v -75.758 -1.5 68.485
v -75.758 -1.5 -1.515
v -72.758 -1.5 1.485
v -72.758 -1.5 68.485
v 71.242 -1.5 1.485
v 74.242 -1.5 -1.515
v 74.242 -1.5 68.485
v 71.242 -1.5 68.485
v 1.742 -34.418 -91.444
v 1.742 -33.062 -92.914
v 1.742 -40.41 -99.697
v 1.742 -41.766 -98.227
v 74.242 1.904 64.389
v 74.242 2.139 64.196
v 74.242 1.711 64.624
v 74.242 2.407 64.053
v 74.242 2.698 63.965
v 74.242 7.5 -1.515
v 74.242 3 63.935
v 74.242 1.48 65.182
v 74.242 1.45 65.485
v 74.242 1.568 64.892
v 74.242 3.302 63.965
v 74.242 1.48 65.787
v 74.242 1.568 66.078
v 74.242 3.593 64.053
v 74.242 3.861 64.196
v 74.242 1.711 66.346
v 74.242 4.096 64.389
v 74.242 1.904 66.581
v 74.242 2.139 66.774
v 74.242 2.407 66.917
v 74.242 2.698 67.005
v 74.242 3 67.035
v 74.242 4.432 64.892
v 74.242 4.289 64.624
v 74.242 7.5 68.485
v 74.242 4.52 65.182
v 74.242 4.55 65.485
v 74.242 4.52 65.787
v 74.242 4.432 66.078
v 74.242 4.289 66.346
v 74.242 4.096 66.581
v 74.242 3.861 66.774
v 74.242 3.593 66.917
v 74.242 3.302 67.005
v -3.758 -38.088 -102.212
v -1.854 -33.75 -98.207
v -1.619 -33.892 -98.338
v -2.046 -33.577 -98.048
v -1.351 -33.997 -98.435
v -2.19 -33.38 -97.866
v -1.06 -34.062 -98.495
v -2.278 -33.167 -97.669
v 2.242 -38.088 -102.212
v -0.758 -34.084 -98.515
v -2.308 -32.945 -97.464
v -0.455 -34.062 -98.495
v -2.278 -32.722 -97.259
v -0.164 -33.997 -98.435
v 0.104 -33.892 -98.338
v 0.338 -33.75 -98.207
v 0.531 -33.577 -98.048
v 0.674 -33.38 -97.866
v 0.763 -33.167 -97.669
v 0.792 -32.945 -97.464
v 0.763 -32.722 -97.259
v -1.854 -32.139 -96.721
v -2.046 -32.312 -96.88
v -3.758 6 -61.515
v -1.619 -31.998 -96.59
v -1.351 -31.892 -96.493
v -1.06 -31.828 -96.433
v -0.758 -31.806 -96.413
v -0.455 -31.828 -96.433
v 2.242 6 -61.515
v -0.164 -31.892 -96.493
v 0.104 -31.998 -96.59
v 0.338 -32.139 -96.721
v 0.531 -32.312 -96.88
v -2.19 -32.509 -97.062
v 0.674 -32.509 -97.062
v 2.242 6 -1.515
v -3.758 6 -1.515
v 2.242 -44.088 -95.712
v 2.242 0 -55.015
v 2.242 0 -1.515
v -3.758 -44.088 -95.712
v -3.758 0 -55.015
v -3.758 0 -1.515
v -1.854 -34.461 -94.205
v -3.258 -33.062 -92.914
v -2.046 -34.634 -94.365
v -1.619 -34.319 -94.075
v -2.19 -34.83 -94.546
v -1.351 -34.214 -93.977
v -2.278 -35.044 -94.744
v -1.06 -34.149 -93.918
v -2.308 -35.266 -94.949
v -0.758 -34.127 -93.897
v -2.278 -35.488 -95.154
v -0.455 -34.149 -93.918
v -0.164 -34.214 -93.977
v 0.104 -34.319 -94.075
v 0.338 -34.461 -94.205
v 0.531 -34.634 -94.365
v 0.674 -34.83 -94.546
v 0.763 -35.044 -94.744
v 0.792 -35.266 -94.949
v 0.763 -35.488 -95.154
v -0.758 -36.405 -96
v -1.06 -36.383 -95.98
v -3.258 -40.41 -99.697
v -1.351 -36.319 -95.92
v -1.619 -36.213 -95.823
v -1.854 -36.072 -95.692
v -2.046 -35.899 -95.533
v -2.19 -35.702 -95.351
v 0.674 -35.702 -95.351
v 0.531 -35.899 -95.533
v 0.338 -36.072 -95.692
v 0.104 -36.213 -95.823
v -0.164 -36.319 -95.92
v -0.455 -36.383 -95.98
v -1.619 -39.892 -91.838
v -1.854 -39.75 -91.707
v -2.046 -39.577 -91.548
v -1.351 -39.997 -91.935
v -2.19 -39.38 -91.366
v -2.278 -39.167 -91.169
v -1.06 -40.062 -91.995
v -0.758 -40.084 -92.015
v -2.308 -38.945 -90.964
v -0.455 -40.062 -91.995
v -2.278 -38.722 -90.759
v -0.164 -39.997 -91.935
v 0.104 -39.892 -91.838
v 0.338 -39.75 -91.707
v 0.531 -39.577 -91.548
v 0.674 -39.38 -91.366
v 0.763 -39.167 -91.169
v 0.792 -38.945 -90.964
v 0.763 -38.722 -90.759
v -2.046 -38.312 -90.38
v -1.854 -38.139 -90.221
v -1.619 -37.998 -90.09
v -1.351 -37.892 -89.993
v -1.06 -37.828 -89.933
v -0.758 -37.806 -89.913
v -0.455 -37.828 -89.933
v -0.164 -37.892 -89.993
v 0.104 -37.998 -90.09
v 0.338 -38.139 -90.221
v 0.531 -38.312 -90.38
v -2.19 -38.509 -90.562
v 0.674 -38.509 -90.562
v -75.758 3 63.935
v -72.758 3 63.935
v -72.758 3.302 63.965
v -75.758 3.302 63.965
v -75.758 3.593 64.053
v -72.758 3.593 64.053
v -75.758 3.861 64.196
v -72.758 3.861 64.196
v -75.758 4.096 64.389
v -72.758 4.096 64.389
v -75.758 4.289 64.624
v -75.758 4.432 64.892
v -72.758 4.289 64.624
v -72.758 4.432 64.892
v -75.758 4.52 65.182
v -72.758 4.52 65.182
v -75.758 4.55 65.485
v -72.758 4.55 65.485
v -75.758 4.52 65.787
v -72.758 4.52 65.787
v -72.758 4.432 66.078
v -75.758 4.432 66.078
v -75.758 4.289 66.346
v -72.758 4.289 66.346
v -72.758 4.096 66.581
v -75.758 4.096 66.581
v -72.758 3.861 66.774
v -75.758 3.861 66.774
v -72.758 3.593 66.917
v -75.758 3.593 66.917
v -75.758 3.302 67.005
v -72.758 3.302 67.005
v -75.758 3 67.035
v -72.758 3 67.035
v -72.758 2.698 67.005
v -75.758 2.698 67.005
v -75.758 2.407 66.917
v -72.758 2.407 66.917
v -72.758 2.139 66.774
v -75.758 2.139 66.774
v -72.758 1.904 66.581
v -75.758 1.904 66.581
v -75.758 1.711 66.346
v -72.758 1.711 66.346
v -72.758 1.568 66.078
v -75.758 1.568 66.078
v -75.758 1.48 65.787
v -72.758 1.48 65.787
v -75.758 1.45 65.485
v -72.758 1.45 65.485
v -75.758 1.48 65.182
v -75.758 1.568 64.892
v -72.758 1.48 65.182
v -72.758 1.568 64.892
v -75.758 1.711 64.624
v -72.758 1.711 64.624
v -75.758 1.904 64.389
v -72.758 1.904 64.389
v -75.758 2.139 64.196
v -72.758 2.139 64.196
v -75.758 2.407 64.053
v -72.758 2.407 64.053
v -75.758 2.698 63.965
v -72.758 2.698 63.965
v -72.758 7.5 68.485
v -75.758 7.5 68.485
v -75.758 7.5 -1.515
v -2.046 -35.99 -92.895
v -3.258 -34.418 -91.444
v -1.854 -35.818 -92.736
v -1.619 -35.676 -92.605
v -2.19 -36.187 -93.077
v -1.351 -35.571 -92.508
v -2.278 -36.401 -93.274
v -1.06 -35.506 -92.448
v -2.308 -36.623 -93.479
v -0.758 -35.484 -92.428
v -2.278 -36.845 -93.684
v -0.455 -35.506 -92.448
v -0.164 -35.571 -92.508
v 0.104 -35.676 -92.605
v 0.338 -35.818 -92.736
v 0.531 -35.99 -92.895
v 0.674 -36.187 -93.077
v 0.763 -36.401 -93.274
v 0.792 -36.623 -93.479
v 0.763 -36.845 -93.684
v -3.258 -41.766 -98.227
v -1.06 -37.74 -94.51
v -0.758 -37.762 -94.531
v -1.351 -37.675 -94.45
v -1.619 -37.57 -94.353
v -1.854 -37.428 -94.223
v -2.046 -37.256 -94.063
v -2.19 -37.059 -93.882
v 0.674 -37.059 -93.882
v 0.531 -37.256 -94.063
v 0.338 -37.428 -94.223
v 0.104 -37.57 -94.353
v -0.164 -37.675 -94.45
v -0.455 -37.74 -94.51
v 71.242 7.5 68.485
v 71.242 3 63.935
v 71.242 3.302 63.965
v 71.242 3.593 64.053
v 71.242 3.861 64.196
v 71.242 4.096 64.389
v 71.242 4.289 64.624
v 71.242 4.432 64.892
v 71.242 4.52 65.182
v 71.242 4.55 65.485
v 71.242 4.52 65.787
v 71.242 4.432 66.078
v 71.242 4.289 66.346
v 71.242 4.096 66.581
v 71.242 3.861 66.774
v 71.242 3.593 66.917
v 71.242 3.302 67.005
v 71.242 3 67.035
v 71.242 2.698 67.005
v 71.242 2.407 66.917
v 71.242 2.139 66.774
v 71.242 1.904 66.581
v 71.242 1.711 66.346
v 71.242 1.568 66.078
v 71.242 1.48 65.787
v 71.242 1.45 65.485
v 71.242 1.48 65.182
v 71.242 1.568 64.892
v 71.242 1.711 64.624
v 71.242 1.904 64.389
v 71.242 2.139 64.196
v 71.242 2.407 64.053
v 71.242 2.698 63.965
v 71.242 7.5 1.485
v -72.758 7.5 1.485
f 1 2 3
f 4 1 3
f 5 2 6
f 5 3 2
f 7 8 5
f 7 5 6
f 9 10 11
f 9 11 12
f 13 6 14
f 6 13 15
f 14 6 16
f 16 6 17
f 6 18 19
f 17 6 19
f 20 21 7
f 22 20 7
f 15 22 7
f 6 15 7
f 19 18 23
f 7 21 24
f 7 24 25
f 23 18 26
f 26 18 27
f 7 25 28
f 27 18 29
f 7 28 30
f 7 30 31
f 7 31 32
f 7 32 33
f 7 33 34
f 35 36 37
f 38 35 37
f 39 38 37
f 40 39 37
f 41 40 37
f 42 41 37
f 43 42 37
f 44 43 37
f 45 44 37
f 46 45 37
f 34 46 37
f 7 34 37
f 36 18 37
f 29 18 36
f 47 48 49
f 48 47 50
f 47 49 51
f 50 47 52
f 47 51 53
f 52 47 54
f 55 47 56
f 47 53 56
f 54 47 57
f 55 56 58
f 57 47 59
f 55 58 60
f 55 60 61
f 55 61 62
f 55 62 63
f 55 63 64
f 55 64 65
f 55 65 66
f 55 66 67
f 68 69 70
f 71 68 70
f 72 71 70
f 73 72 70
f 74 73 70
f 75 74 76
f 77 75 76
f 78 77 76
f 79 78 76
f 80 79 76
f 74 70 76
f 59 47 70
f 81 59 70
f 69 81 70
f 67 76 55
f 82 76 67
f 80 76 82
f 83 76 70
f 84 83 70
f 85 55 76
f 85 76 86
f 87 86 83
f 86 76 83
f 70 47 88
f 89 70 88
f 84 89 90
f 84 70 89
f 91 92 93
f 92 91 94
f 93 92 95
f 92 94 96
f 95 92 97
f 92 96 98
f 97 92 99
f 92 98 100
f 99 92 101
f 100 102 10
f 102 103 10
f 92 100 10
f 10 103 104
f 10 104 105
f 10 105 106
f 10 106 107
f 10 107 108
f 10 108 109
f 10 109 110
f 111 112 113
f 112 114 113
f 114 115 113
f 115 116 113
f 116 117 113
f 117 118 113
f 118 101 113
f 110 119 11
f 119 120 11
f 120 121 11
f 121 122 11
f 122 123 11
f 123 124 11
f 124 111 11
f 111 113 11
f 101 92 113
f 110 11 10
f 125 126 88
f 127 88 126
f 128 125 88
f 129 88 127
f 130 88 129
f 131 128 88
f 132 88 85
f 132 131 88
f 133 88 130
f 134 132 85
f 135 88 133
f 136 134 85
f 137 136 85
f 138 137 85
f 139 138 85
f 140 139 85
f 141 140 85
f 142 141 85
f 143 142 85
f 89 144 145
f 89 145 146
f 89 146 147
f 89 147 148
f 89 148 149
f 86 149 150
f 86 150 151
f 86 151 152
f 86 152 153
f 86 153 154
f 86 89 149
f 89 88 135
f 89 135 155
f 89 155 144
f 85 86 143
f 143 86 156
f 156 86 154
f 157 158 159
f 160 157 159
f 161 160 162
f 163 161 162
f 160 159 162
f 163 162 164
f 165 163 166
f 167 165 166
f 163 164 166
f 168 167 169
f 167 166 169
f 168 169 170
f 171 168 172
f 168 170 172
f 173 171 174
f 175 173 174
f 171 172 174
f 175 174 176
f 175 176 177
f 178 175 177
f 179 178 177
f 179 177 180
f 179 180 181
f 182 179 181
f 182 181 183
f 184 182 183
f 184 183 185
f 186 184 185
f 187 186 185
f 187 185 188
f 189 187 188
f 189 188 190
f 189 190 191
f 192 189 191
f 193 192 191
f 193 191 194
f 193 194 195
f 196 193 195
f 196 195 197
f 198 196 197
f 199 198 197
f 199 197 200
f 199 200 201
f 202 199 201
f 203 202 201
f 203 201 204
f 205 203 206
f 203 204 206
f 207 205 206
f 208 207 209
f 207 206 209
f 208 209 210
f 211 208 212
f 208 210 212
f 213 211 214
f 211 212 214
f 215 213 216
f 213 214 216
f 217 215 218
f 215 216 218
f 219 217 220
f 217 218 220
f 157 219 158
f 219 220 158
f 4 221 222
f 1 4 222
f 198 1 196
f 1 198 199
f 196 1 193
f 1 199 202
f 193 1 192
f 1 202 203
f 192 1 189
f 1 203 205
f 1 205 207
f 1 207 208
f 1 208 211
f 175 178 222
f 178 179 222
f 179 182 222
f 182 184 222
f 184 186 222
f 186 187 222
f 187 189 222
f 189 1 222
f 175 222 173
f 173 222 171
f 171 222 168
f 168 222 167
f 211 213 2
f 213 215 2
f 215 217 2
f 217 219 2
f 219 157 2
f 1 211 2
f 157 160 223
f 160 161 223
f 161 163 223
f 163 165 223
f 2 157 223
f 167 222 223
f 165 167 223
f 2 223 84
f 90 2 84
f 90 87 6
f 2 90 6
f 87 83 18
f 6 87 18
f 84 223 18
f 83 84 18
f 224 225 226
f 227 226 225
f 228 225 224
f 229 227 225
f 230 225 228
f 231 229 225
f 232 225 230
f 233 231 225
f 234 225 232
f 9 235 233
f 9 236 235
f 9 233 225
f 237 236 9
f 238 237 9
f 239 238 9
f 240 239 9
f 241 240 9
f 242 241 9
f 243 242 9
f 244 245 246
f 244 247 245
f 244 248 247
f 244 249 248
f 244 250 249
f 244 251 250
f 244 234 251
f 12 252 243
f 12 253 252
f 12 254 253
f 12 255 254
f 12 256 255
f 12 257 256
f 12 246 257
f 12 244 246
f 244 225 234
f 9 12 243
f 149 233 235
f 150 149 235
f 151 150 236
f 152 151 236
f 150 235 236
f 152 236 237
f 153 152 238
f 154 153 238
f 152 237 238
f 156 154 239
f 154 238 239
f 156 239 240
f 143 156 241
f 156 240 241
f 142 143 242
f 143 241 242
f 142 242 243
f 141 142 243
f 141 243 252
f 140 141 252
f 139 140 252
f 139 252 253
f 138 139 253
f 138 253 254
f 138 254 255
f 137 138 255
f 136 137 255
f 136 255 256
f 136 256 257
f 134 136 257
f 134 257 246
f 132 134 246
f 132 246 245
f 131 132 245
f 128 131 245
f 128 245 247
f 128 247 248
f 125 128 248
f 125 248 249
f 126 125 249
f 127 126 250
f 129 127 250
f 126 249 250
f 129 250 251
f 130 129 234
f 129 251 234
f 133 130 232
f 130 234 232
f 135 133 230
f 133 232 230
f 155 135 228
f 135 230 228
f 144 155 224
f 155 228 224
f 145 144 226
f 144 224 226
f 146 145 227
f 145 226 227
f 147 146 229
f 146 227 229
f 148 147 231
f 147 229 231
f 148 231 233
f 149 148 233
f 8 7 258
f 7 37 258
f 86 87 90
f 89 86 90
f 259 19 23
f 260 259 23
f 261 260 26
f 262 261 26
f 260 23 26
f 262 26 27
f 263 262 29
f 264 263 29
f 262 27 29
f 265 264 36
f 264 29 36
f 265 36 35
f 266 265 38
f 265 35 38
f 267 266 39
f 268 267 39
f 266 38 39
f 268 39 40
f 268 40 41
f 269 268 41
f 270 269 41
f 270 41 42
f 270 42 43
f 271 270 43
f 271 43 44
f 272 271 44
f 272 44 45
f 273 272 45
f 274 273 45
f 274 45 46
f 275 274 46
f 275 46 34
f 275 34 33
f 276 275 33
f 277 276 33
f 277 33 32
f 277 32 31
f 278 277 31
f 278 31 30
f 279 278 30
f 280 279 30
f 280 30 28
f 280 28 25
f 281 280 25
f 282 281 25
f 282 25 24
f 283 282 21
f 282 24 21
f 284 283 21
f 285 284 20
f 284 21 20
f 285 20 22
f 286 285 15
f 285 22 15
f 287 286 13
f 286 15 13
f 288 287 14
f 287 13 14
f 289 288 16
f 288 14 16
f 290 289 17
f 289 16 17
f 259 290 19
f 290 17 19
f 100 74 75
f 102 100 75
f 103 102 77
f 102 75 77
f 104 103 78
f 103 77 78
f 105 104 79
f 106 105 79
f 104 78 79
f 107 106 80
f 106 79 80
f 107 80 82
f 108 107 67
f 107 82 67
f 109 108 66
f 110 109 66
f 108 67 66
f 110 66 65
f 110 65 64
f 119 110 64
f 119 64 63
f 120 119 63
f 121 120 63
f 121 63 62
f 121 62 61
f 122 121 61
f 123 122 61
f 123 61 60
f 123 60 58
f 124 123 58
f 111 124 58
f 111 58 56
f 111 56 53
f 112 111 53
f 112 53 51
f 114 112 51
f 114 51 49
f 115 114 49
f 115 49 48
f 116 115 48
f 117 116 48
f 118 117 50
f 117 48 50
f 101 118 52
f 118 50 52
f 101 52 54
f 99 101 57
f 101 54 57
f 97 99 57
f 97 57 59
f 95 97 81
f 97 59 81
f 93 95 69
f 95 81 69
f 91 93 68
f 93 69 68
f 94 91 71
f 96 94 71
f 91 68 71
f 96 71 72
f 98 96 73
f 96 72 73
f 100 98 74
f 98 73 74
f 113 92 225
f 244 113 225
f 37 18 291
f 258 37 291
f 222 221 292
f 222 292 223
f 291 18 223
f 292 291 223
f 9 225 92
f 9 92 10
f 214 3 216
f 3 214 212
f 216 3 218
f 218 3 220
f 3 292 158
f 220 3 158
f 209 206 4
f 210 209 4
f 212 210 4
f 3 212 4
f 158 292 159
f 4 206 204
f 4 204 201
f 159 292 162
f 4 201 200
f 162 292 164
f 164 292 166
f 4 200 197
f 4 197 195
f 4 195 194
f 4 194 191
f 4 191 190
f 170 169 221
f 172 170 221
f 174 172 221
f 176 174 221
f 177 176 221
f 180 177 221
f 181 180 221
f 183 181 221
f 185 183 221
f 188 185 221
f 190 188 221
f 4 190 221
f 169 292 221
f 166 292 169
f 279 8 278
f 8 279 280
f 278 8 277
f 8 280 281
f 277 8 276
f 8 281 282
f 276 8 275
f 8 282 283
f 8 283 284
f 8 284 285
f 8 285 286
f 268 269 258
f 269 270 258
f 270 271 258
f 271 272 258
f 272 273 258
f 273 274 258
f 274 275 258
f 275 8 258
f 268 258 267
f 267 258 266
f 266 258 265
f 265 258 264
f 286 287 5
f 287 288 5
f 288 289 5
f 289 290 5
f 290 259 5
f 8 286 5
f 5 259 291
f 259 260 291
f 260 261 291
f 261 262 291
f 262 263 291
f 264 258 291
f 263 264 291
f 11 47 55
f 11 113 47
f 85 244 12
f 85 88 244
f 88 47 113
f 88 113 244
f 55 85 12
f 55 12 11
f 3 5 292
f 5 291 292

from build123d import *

# Parameters (mm, degrees)
EXTRUDE_2_DEPTH     = 6
SKETCH_2_R          = 1.55
CUT_EXTRUDE_1_DEPTH = 10
SKETCH_3_R          = 1.55
CUT_EXTRUDE_2_DEPTH = 10
EXTRUDE_4_DEPTH     = 1.5
EXTRUDE_5_DEPTH     = 1.5
SKETCH_5_W          = 6
SKETCH_5_H          = 6
EXTRUDE_6_DEPTH     = 60
CUT_EXTRUDE_3_DEPTH = 60
SKETCH_9_W          = 6
SKETCH_9_H          = 8.845903007
EXTRUDE_7_DEPTH     = 60
SKETCH_10_W         = 5
SKETCH_10_H         = 2
CUT_EXTRUDE_4_DEPTH = 10
SKETCH_11_R         = 1.55
CUT_EXTRUDE_5_DEPTH = 10


with BuildPart() as part:
    # 草图1 → 凸台-拉伸2 (new body)
    with BuildSketch(Plane(origin=(0, 0, 0), x_dir=(1, 0, 0), z_dir=(0, 1, 0))):
        Polygon((-72.757575758, -68.484848485), (-72.757575758, -1.484848485), (71.242424242, -1.484848485), (71.242424242, -68.484848485), (74.242424242, -68.484848485), (74.242424242, -1.484848485), (74.242424242, 1.515151515), (71.242424242, 1.515151515), (-72.757575758, 1.515151515), (-75.757575758, 1.515151515), (-75.757575758, -1.484848485), (-75.757575758, -68.484848485), align=None)
    extrude(amount=EXTRUDE_2_DEPTH)

    # 草图2 → 切除-拉伸1 (cut)
    with BuildSketch(Plane(origin=(-72.757575758, 0, 0), x_dir=(0, 0, -1), z_dir=(1, 0, 0))):
        with Locations((-65.484848485, 3)):
            Circle(SKETCH_2_R)
    extrude(amount=-CUT_EXTRUDE_1_DEPTH, mode=Mode.SUBTRACT)

    # 草图3 → 切除-拉伸2 (cut)
    with BuildSketch(Plane(origin=(74.242424242, 0, 0), x_dir=(0, 0, -1), z_dir=(1, 0, 0))):
        with Locations((-65.484848485, 3)):
            Circle(SKETCH_3_R)
    extrude(amount=-CUT_EXTRUDE_2_DEPTH, mode=Mode.SUBTRACT)

    # 草图6 → 凸台-拉伸4 (add)
    with BuildSketch(Plane(origin=(0, 6, 0), x_dir=(1, 0, 0), z_dir=(0, 1, 0))):
        Polygon((-75.757575758, 1.515151515), (74.242424242, 1.515151515), (74.242424242, -68.484848485), (71.242424242, -68.484848485), (71.242424242, -1.484848485), (-72.757575758, -1.484848485), (-72.757575758, -68.484848485), (-75.757575758, -68.484848485), align=None)
    extrude(amount=EXTRUDE_4_DEPTH)

    # 草图7 → 凸台-拉伸5 (add)
    with BuildSketch(Plane.XZ):
        Polygon((-75.757575758, 68.484848485), (-75.757575758, -1.515151515), (74.242424242, -1.515151515), (74.242424242, 68.484848485), (71.242424242, 68.484848485), (71.242424242, 1.484848485), (-72.757575758, 1.484848485), (-72.757575758, 68.484848485), align=None)
    extrude(amount=EXTRUDE_5_DEPTH)

    # 草图5 → 凸台-拉伸6 (add)
    with BuildSketch(Plane(origin=(0, 0, -1.515151515), x_dir=(-1, 0, 0), z_dir=(0, 0, -1))):
        with Locations((0.757575758, 3)):
            Rectangle(SKETCH_5_W, SKETCH_5_H)
    extrude(amount=EXTRUDE_6_DEPTH)

    # 草图8 → 切除-拉伸3 (cut)
    with BuildSketch(Plane(origin=(2.242424242, 0, 0), x_dir=(0, 0, -1), z_dir=(1, 0, 0))):
        Polygon((61.515151515, 6), (55.015151515, 0), (61.515151515, 0), align=None)
    extrude(amount=-CUT_EXTRUDE_3_DEPTH, mode=Mode.SUBTRACT)

    # 草图9 → 凸台-拉伸7 (add)
    with BuildSketch(Plane(origin=(0, -27.419692129, -25.310485042), x_dir=(1, 0, 0), z_dir=(0, -0.7348034446274878, -0.678280102733066))):
        with Locations((-0.757575758, -44.848274344)):
            Rectangle(SKETCH_9_W, SKETCH_9_H)
    extrude(amount=EXTRUDE_7_DEPTH)

    # 草图10 → 切除-拉伸4 (cut)
    with BuildSketch(Plane(origin=(0, -71.507898807, -66.007291206), x_dir=(1, 0, 0), z_dir=(0, -0.7348034446274876, -0.6782801027330662))):
        with Locations((-0.757575758, -44.848274343)):
            Rectangle(SKETCH_10_W, SKETCH_10_H)
    extrude(amount=-CUT_EXTRUDE_4_DEPTH, mode=Mode.SUBTRACT)

    # 草图11 → 切除-拉伸5 (cut)
    with BuildSketch(Plane(origin=(0, 33.419692129, -36.204666473), x_dir=(-1, 0, 0), z_dir=(0, 0.6782801027330662, -0.7348034446274876))):
        with Locations(Location((0.757575758, -90.315682622, 0), (0, 0, 90))):
            Circle(SKETCH_11_R)
    extrude(amount=-CUT_EXTRUDE_5_DEPTH, mode=Mode.SUBTRACT)


solid = part.part
